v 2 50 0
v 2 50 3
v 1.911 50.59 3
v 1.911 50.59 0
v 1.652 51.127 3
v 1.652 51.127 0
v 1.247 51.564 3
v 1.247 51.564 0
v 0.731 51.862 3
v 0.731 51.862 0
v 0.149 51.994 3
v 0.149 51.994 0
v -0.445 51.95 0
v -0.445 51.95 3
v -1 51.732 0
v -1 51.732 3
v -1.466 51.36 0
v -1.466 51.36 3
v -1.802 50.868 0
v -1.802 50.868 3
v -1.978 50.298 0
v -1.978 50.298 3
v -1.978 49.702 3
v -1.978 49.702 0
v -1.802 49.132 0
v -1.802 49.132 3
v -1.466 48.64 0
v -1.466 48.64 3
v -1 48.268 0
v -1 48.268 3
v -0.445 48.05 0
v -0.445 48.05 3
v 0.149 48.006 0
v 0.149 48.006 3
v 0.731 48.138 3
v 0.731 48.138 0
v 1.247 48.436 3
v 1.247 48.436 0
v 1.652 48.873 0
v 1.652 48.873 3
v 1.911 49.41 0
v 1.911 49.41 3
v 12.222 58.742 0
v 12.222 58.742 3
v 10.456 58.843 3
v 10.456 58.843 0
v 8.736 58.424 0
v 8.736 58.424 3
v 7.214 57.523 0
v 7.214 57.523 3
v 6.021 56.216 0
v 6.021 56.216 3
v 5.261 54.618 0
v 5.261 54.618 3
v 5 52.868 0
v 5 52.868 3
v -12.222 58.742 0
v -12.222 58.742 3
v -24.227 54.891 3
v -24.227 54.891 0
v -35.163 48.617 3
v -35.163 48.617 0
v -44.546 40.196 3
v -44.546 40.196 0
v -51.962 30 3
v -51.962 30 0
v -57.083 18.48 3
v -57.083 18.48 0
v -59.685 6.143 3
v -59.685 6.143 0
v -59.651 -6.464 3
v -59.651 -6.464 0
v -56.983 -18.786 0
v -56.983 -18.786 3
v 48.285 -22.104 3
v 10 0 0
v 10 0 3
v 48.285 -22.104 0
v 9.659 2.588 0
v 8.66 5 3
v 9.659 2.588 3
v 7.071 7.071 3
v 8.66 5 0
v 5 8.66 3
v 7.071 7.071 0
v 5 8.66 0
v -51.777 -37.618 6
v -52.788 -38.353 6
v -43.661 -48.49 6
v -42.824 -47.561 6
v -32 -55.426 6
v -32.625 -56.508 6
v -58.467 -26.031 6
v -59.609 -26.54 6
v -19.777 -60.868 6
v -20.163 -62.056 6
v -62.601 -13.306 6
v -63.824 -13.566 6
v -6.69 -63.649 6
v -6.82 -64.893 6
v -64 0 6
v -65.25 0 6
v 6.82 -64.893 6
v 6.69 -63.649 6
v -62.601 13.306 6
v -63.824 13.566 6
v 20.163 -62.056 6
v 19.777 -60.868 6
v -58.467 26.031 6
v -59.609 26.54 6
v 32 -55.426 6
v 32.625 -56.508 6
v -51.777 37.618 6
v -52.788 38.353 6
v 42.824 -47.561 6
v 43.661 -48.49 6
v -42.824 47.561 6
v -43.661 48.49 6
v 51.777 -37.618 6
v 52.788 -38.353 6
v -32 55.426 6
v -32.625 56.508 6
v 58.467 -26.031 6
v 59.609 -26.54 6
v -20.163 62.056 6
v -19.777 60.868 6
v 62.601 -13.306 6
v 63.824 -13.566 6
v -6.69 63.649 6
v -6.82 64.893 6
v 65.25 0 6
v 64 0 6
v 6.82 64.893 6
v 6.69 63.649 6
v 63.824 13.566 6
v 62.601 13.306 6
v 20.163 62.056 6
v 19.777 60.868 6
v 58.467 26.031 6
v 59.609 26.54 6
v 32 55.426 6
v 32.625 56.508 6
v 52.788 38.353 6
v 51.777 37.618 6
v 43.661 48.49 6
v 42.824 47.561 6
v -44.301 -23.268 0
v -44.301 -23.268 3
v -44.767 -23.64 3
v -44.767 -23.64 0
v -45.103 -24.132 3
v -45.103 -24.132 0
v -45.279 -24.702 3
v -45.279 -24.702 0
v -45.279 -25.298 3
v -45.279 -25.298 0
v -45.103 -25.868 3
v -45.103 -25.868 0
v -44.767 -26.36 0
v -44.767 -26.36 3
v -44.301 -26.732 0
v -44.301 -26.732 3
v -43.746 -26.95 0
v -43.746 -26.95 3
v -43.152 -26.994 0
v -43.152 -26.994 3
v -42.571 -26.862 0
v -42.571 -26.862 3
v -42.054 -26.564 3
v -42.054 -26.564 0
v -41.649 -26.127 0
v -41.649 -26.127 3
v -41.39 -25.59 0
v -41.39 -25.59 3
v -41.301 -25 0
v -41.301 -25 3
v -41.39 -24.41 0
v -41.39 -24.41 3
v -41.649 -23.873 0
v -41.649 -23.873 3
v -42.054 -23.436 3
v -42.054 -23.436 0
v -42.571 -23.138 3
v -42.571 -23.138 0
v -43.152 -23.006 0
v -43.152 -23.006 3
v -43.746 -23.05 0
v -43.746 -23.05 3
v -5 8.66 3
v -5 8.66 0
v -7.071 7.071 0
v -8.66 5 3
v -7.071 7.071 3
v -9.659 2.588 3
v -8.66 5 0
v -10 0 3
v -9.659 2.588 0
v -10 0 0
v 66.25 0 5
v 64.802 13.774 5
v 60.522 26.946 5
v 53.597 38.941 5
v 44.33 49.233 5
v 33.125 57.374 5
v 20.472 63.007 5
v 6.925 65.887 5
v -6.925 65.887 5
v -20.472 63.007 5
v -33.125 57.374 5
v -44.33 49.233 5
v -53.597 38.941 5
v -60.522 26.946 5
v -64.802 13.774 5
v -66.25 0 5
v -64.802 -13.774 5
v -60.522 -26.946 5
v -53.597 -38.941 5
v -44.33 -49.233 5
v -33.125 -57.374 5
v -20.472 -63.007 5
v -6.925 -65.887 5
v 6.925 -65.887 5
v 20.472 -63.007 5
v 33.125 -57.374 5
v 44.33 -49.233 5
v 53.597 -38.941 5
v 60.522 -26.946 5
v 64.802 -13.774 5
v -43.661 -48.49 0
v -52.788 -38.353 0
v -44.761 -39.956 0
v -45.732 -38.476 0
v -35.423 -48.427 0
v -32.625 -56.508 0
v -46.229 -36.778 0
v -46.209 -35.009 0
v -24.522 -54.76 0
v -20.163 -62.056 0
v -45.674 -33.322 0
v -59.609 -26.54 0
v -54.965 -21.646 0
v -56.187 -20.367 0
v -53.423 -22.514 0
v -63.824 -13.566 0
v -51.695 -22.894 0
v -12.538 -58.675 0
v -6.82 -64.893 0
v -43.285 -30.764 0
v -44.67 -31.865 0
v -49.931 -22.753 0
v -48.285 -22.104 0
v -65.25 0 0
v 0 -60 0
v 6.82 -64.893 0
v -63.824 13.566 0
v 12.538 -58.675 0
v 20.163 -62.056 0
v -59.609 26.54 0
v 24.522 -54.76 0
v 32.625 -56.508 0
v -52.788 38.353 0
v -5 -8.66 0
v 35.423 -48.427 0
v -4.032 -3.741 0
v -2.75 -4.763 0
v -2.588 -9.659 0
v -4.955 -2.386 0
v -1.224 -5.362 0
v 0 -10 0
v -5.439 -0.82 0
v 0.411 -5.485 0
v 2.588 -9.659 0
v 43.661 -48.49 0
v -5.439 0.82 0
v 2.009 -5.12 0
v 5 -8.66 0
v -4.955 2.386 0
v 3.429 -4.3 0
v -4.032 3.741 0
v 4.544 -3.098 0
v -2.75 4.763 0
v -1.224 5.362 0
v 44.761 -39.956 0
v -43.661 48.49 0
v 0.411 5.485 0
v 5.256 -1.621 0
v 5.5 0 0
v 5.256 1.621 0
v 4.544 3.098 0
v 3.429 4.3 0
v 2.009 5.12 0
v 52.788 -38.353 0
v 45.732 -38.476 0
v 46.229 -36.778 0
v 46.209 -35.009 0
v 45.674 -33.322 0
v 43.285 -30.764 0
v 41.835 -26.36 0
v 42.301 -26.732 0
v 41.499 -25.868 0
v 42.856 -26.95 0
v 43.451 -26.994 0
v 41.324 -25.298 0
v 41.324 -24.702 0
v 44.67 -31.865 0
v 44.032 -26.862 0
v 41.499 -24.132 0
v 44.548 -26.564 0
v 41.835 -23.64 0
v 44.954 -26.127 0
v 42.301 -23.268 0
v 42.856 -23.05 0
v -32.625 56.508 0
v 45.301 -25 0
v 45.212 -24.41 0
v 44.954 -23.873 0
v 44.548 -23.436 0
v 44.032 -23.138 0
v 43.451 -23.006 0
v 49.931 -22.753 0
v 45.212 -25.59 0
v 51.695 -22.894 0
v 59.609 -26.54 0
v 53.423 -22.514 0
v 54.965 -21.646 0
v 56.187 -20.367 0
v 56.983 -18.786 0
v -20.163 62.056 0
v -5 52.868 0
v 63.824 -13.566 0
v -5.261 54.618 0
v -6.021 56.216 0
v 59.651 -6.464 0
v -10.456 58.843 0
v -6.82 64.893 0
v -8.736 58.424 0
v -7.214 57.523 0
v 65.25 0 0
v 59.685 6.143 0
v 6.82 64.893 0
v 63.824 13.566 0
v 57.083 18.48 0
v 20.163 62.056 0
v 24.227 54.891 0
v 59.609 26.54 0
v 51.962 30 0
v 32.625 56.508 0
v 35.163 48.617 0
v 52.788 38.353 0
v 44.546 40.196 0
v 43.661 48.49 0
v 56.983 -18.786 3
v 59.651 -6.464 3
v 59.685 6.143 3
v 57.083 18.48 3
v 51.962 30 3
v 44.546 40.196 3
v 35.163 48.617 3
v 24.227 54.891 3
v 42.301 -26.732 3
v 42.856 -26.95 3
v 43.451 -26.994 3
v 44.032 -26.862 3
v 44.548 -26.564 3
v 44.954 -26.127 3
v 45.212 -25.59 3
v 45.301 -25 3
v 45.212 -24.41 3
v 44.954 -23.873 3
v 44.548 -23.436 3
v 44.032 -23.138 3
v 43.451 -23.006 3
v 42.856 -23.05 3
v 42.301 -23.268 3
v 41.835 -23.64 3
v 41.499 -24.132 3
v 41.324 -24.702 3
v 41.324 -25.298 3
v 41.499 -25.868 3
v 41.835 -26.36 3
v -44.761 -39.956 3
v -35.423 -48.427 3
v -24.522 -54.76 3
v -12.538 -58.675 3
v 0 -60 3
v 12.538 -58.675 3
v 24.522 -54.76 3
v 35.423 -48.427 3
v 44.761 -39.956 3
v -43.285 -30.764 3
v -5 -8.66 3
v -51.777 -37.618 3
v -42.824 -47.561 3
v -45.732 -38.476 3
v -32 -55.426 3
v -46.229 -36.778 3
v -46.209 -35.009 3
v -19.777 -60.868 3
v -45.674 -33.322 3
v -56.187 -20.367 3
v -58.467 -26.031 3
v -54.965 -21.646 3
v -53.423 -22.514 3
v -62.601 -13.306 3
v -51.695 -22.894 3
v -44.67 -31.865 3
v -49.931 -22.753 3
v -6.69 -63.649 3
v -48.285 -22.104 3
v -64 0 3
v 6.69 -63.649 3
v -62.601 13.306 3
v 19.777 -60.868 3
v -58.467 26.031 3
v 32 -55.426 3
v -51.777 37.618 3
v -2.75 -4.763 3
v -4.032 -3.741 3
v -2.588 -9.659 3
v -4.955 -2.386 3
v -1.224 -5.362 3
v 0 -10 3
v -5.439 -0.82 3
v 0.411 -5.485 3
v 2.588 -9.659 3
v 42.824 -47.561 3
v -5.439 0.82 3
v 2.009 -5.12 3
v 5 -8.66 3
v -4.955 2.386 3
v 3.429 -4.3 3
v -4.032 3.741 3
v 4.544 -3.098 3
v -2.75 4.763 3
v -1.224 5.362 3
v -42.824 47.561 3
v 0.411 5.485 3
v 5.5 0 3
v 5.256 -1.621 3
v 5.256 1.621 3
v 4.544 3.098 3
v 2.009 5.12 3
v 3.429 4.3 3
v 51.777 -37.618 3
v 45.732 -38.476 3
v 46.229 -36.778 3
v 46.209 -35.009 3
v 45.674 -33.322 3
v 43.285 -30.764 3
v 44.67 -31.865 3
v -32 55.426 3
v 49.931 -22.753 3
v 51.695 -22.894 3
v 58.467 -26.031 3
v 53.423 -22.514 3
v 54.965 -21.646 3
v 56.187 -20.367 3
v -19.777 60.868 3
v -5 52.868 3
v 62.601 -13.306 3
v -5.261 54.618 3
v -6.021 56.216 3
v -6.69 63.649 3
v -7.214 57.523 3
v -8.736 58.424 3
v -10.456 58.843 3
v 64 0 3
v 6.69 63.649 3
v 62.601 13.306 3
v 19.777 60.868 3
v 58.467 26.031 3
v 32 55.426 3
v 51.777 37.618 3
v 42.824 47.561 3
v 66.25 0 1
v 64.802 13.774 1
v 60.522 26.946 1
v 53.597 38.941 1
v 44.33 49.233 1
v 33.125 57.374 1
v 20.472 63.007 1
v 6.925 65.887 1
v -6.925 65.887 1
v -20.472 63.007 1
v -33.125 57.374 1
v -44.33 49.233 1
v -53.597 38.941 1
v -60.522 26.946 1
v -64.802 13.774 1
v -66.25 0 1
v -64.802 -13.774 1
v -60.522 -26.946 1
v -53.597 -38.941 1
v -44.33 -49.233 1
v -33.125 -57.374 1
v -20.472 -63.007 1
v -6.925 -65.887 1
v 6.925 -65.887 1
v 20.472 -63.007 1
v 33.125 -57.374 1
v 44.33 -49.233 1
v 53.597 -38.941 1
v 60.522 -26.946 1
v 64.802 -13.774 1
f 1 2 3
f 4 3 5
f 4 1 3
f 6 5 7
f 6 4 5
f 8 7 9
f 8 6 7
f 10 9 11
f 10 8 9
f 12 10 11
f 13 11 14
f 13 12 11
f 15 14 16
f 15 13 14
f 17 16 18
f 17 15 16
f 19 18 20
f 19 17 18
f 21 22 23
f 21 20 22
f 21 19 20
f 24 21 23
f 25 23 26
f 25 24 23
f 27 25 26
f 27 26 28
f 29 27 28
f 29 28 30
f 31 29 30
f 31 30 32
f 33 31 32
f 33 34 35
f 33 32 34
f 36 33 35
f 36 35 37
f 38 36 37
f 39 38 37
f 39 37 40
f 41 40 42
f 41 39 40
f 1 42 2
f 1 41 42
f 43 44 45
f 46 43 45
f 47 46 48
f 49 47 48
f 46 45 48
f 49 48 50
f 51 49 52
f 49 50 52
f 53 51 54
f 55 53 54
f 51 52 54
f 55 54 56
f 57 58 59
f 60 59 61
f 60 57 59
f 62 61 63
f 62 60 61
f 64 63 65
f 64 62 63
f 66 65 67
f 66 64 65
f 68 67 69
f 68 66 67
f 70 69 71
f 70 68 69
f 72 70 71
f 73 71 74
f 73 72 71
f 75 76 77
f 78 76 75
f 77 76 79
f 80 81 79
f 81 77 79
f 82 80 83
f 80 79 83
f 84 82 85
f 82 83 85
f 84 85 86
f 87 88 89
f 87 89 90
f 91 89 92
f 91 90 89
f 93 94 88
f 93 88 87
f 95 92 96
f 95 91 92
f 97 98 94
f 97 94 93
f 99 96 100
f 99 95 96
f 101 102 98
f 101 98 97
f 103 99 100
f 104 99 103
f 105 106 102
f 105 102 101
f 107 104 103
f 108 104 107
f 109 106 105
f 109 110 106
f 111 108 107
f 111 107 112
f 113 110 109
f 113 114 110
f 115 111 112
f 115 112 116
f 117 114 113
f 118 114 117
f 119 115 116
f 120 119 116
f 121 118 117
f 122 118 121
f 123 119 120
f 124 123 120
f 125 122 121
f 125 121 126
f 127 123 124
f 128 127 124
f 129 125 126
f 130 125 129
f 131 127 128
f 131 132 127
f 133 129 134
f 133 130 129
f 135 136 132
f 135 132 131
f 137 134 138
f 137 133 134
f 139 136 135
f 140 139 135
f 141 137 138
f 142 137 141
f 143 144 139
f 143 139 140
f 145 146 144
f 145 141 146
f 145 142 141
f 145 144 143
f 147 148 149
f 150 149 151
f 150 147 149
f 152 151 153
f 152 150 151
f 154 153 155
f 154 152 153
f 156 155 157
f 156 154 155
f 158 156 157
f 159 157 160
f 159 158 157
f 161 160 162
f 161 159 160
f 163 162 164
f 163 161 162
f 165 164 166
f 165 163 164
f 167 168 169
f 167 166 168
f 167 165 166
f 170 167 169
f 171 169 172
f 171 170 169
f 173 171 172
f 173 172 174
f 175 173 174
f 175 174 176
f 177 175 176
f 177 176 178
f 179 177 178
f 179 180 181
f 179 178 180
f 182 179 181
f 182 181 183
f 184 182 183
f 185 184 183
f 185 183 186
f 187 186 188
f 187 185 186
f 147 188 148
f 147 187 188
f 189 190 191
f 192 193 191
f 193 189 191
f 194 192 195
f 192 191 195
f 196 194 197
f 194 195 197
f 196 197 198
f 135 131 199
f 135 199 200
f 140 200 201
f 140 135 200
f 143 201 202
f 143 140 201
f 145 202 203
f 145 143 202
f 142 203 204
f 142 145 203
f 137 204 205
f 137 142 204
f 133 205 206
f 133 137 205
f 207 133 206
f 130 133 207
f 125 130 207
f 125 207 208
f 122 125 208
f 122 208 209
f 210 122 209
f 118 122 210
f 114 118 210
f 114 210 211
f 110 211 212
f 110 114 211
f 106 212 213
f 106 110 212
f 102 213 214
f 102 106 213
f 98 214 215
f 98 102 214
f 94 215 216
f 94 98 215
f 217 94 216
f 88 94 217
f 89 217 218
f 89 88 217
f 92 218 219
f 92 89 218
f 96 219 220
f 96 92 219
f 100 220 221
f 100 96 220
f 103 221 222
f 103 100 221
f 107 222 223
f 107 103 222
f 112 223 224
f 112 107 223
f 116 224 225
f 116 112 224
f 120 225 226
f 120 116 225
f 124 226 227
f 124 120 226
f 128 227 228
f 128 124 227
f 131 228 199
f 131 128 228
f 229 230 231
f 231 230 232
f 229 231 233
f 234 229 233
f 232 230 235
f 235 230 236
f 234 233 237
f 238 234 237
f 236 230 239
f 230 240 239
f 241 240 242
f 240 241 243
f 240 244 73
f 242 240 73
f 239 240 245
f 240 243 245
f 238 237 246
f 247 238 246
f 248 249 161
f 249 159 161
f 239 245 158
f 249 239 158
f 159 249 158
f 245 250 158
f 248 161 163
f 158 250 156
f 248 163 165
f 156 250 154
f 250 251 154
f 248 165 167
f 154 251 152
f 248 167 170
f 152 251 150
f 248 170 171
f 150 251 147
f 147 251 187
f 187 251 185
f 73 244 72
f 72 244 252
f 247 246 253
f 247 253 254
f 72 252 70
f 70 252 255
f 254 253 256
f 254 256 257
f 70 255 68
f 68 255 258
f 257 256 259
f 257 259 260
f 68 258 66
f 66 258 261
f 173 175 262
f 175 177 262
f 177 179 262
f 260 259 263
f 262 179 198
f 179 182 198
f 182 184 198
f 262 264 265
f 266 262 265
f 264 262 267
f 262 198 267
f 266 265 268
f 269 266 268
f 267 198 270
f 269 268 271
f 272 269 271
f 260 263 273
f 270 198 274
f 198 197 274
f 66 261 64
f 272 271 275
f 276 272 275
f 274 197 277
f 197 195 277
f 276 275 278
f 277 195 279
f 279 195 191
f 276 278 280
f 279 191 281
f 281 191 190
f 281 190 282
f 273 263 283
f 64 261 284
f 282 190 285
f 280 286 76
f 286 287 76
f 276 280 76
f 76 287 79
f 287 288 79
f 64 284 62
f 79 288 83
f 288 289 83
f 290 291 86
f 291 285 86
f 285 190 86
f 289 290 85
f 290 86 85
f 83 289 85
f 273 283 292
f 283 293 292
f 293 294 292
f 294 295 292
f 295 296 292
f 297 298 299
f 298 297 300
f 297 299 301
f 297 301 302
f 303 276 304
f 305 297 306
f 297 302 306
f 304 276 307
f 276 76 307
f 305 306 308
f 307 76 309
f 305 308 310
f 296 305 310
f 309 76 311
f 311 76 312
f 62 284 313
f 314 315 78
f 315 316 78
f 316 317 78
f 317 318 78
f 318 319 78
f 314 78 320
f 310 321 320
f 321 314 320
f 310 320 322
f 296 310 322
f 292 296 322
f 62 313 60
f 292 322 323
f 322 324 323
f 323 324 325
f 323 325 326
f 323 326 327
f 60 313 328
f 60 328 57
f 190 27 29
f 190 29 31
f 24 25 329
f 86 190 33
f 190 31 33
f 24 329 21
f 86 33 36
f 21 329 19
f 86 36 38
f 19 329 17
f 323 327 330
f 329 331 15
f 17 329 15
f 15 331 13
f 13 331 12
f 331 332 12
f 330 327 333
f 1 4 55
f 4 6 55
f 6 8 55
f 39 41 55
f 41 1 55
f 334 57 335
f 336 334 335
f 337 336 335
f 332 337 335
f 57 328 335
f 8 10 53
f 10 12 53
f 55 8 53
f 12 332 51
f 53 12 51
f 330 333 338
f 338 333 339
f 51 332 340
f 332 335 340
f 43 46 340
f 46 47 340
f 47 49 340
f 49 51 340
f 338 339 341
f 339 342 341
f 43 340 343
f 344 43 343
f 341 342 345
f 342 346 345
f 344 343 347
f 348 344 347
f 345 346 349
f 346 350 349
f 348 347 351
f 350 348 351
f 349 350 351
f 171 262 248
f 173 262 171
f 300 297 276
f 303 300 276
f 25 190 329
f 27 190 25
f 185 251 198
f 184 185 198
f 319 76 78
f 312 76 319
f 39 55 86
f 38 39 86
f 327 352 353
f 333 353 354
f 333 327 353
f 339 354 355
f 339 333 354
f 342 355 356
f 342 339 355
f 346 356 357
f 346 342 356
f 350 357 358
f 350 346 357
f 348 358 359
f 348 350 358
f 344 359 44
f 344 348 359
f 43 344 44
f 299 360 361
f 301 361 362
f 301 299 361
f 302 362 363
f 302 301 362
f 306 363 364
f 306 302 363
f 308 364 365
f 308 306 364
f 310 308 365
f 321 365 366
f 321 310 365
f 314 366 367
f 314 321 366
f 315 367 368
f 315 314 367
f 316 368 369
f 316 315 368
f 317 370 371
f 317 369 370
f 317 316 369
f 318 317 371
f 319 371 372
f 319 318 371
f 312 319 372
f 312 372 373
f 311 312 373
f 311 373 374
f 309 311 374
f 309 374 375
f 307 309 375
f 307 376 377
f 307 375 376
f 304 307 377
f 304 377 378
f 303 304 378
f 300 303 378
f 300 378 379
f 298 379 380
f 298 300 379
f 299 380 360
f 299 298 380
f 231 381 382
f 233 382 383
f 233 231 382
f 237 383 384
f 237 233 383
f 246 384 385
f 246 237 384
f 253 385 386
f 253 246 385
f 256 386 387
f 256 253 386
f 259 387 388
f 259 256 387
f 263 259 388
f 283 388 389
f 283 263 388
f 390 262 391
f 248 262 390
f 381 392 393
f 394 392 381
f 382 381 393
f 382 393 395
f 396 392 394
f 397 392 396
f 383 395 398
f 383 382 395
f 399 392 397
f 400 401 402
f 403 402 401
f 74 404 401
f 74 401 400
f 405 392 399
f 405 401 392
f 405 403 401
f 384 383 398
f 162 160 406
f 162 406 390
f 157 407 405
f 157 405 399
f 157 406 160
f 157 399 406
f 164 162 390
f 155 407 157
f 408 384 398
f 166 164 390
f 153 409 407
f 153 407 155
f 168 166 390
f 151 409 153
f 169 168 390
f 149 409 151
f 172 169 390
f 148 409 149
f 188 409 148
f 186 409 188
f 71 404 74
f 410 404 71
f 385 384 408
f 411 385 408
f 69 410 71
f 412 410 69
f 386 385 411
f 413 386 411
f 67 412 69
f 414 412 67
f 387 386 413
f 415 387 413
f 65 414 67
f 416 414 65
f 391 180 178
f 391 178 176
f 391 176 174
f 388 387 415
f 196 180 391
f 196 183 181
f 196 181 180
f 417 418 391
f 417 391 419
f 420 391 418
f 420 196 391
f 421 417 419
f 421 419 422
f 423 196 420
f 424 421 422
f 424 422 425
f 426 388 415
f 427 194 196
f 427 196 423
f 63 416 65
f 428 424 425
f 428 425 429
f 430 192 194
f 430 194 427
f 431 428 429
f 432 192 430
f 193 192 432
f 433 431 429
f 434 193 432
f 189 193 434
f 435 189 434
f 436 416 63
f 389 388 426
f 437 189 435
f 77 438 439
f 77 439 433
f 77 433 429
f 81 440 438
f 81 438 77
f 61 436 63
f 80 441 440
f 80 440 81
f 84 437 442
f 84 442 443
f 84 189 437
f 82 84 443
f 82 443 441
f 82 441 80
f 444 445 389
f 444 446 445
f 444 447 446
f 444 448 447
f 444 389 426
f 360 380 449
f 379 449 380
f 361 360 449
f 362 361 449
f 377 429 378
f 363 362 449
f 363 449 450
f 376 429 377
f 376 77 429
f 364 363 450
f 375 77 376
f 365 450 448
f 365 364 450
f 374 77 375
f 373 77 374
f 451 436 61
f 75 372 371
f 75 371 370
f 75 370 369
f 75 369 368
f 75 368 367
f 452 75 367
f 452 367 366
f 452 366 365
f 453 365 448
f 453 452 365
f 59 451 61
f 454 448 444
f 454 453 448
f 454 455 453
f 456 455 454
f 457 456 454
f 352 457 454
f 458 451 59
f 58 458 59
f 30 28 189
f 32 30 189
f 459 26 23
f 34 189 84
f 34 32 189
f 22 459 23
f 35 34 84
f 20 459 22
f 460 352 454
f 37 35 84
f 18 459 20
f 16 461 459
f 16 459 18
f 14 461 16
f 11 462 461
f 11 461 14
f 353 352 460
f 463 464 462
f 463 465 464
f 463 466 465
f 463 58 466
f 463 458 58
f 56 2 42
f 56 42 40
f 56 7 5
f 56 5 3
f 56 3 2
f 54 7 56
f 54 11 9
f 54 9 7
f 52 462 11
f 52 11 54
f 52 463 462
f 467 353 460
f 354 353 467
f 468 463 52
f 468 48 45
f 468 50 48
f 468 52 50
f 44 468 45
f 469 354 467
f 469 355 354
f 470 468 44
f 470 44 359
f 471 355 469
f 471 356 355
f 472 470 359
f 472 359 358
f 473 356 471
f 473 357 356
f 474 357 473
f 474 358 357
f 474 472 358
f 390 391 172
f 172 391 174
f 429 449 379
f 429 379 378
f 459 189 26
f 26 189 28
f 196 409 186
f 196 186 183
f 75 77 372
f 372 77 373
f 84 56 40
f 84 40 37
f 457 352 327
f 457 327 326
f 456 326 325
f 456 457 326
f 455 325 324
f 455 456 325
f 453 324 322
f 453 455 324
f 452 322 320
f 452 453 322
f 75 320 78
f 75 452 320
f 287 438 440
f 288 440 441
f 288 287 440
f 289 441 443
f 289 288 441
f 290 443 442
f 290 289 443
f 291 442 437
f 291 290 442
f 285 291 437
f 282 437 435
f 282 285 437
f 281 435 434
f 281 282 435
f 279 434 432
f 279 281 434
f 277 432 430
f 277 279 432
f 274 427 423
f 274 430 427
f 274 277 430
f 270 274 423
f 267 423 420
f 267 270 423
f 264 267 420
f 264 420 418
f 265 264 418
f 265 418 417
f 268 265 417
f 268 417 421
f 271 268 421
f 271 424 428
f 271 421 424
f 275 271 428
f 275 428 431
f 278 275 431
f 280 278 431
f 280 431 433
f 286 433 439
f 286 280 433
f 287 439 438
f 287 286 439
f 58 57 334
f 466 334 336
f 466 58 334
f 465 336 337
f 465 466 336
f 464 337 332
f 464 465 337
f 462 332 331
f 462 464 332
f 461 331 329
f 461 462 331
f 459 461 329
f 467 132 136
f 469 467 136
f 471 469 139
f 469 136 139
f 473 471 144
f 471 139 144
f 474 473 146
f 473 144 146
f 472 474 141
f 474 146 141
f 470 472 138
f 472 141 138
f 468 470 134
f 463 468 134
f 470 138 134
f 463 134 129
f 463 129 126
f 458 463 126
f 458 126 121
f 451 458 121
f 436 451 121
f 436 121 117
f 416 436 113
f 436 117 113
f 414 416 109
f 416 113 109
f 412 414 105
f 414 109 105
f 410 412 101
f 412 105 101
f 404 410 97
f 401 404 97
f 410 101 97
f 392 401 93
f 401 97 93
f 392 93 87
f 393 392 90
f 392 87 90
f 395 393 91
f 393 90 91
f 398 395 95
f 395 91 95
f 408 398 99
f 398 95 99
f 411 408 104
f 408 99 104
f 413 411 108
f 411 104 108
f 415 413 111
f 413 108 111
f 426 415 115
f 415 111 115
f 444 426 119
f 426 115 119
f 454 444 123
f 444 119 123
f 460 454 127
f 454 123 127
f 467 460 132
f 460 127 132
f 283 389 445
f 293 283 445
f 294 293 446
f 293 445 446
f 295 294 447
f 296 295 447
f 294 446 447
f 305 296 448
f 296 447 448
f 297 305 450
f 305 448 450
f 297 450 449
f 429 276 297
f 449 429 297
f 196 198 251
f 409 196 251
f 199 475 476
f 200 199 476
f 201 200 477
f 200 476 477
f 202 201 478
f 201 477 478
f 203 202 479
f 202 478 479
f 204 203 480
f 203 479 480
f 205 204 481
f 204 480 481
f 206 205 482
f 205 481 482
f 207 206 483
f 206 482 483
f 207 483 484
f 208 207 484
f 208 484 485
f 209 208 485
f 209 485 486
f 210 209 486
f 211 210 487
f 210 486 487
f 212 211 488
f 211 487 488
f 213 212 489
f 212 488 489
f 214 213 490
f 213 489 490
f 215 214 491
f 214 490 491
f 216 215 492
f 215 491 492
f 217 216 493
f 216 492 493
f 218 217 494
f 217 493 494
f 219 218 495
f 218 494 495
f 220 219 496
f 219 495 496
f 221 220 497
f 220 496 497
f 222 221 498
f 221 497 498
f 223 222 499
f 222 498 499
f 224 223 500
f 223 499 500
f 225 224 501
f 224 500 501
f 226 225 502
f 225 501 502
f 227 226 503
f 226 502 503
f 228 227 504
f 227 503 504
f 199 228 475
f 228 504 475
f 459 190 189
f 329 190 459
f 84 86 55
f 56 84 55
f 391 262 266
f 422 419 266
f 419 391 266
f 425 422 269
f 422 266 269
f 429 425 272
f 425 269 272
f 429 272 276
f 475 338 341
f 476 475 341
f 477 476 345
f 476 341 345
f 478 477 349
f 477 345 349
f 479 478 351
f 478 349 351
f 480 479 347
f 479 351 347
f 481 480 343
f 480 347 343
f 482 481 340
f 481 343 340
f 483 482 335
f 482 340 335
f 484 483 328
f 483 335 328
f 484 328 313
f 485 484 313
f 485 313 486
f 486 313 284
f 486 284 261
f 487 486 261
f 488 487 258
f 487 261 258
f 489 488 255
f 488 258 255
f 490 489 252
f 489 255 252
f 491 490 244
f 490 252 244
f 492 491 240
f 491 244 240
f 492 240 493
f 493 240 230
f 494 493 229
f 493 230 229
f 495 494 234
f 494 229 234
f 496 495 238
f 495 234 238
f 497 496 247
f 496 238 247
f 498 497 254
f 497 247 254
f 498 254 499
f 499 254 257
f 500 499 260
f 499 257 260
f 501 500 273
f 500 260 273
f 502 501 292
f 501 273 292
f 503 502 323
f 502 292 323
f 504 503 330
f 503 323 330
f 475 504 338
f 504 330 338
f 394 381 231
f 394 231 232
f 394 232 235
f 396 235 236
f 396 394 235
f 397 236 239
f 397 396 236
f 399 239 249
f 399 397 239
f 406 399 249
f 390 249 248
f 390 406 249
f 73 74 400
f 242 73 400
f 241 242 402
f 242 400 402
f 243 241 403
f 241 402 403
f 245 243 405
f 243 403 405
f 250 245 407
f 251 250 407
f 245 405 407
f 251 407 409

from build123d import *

# Parameters (mm, degrees)
SKETCH_R           = 66.25
PAD_DEPTH          = 6
SKETCH001_R        = 5.5
POCKET_DEPTH       = 6.001
SKETCH002_R        = 2
POCKET001_DEPTH    = 380.959664
POLARPATTERN_COUNT = 3
CHAMFER_SIZE       = 1
FILLET_R           = 6
SKETCH003_R        = 64
POCKET002_DEPTH    = 3


with BuildPart() as part:
    # Sketch → Pad (new body)
    with BuildSketch(Plane.XY):
        Circle(SKETCH_R)
    extrude(amount=PAD_DEPTH)

    # Sketch001 → Pocket (cut, through all)
    with BuildSketch(Plane.XY):
        Circle(SKETCH001_R)
    extrude(amount=POCKET_DEPTH, mode=Mode.SUBTRACT)

    # Sketch002 → Pocket001 (cut, through all)
    with BuildSketch(Plane.XY):
        with Locations((0, 50)):
            Circle(SKETCH002_R)
        with BuildLine():
            ThreePointArc((-5, 59.791304), (-51.961524, 30), (-54.280788, -25.565525))
            Line((-10, 0), (-54.280788, -25.565525))
            ThreePointArc((-5, 8.660254), (-8.660254, 5), (-10, 0))
            Line((-5, 8.660254), (-5, 59.791304))
        make_face()
    pocket001 = extrude(amount=POCKET001_DEPTH, mode=Mode.SUBTRACT)

    # PolarPattern: Pocket001 ×3 about axis
    polarpattern_axis = Axis((0, 0, 0), (0, 0, 1))
    for i in range(1, POLARPATTERN_COUNT):
        add(pocket001.rotate(polarpattern_axis, i * 360 / POLARPATTERN_COUNT), mode=Mode.SUBTRACT)

    # Chamfer
    chamfer_edges = [part.edges().sort_by_distance(p)[0] for p in [
        (-66.25, 0, 6),
        (-66.25, 0, 0),
    ]]
    chamfer(chamfer_edges, length=CHAMFER_SIZE)

    # Fillet
    fillet_edges = [part.edges().sort_by_distance(p)[0] for p in [
        (-54.280788, -25.565525, 3),
        (-5, 59.791304, 3),
        (5, 59.791304, 3),
        (54.280788, -25.565525, 3),
        (49.280788, -34.225779, 3),
        (-49.280788, -34.225779, 3),
    ]]
    fillet(fillet_edges, radius=FILLET_R)

    # Sketch003 (on Face25 of Fillet) → Pocket002 (cut)
    with BuildSketch(Plane.XY.offset(6)):
        Circle(SKETCH003_R)
    extrude(amount=-POCKET002_DEPTH, mode=Mode.SUBTRACT)


solid = part.part
